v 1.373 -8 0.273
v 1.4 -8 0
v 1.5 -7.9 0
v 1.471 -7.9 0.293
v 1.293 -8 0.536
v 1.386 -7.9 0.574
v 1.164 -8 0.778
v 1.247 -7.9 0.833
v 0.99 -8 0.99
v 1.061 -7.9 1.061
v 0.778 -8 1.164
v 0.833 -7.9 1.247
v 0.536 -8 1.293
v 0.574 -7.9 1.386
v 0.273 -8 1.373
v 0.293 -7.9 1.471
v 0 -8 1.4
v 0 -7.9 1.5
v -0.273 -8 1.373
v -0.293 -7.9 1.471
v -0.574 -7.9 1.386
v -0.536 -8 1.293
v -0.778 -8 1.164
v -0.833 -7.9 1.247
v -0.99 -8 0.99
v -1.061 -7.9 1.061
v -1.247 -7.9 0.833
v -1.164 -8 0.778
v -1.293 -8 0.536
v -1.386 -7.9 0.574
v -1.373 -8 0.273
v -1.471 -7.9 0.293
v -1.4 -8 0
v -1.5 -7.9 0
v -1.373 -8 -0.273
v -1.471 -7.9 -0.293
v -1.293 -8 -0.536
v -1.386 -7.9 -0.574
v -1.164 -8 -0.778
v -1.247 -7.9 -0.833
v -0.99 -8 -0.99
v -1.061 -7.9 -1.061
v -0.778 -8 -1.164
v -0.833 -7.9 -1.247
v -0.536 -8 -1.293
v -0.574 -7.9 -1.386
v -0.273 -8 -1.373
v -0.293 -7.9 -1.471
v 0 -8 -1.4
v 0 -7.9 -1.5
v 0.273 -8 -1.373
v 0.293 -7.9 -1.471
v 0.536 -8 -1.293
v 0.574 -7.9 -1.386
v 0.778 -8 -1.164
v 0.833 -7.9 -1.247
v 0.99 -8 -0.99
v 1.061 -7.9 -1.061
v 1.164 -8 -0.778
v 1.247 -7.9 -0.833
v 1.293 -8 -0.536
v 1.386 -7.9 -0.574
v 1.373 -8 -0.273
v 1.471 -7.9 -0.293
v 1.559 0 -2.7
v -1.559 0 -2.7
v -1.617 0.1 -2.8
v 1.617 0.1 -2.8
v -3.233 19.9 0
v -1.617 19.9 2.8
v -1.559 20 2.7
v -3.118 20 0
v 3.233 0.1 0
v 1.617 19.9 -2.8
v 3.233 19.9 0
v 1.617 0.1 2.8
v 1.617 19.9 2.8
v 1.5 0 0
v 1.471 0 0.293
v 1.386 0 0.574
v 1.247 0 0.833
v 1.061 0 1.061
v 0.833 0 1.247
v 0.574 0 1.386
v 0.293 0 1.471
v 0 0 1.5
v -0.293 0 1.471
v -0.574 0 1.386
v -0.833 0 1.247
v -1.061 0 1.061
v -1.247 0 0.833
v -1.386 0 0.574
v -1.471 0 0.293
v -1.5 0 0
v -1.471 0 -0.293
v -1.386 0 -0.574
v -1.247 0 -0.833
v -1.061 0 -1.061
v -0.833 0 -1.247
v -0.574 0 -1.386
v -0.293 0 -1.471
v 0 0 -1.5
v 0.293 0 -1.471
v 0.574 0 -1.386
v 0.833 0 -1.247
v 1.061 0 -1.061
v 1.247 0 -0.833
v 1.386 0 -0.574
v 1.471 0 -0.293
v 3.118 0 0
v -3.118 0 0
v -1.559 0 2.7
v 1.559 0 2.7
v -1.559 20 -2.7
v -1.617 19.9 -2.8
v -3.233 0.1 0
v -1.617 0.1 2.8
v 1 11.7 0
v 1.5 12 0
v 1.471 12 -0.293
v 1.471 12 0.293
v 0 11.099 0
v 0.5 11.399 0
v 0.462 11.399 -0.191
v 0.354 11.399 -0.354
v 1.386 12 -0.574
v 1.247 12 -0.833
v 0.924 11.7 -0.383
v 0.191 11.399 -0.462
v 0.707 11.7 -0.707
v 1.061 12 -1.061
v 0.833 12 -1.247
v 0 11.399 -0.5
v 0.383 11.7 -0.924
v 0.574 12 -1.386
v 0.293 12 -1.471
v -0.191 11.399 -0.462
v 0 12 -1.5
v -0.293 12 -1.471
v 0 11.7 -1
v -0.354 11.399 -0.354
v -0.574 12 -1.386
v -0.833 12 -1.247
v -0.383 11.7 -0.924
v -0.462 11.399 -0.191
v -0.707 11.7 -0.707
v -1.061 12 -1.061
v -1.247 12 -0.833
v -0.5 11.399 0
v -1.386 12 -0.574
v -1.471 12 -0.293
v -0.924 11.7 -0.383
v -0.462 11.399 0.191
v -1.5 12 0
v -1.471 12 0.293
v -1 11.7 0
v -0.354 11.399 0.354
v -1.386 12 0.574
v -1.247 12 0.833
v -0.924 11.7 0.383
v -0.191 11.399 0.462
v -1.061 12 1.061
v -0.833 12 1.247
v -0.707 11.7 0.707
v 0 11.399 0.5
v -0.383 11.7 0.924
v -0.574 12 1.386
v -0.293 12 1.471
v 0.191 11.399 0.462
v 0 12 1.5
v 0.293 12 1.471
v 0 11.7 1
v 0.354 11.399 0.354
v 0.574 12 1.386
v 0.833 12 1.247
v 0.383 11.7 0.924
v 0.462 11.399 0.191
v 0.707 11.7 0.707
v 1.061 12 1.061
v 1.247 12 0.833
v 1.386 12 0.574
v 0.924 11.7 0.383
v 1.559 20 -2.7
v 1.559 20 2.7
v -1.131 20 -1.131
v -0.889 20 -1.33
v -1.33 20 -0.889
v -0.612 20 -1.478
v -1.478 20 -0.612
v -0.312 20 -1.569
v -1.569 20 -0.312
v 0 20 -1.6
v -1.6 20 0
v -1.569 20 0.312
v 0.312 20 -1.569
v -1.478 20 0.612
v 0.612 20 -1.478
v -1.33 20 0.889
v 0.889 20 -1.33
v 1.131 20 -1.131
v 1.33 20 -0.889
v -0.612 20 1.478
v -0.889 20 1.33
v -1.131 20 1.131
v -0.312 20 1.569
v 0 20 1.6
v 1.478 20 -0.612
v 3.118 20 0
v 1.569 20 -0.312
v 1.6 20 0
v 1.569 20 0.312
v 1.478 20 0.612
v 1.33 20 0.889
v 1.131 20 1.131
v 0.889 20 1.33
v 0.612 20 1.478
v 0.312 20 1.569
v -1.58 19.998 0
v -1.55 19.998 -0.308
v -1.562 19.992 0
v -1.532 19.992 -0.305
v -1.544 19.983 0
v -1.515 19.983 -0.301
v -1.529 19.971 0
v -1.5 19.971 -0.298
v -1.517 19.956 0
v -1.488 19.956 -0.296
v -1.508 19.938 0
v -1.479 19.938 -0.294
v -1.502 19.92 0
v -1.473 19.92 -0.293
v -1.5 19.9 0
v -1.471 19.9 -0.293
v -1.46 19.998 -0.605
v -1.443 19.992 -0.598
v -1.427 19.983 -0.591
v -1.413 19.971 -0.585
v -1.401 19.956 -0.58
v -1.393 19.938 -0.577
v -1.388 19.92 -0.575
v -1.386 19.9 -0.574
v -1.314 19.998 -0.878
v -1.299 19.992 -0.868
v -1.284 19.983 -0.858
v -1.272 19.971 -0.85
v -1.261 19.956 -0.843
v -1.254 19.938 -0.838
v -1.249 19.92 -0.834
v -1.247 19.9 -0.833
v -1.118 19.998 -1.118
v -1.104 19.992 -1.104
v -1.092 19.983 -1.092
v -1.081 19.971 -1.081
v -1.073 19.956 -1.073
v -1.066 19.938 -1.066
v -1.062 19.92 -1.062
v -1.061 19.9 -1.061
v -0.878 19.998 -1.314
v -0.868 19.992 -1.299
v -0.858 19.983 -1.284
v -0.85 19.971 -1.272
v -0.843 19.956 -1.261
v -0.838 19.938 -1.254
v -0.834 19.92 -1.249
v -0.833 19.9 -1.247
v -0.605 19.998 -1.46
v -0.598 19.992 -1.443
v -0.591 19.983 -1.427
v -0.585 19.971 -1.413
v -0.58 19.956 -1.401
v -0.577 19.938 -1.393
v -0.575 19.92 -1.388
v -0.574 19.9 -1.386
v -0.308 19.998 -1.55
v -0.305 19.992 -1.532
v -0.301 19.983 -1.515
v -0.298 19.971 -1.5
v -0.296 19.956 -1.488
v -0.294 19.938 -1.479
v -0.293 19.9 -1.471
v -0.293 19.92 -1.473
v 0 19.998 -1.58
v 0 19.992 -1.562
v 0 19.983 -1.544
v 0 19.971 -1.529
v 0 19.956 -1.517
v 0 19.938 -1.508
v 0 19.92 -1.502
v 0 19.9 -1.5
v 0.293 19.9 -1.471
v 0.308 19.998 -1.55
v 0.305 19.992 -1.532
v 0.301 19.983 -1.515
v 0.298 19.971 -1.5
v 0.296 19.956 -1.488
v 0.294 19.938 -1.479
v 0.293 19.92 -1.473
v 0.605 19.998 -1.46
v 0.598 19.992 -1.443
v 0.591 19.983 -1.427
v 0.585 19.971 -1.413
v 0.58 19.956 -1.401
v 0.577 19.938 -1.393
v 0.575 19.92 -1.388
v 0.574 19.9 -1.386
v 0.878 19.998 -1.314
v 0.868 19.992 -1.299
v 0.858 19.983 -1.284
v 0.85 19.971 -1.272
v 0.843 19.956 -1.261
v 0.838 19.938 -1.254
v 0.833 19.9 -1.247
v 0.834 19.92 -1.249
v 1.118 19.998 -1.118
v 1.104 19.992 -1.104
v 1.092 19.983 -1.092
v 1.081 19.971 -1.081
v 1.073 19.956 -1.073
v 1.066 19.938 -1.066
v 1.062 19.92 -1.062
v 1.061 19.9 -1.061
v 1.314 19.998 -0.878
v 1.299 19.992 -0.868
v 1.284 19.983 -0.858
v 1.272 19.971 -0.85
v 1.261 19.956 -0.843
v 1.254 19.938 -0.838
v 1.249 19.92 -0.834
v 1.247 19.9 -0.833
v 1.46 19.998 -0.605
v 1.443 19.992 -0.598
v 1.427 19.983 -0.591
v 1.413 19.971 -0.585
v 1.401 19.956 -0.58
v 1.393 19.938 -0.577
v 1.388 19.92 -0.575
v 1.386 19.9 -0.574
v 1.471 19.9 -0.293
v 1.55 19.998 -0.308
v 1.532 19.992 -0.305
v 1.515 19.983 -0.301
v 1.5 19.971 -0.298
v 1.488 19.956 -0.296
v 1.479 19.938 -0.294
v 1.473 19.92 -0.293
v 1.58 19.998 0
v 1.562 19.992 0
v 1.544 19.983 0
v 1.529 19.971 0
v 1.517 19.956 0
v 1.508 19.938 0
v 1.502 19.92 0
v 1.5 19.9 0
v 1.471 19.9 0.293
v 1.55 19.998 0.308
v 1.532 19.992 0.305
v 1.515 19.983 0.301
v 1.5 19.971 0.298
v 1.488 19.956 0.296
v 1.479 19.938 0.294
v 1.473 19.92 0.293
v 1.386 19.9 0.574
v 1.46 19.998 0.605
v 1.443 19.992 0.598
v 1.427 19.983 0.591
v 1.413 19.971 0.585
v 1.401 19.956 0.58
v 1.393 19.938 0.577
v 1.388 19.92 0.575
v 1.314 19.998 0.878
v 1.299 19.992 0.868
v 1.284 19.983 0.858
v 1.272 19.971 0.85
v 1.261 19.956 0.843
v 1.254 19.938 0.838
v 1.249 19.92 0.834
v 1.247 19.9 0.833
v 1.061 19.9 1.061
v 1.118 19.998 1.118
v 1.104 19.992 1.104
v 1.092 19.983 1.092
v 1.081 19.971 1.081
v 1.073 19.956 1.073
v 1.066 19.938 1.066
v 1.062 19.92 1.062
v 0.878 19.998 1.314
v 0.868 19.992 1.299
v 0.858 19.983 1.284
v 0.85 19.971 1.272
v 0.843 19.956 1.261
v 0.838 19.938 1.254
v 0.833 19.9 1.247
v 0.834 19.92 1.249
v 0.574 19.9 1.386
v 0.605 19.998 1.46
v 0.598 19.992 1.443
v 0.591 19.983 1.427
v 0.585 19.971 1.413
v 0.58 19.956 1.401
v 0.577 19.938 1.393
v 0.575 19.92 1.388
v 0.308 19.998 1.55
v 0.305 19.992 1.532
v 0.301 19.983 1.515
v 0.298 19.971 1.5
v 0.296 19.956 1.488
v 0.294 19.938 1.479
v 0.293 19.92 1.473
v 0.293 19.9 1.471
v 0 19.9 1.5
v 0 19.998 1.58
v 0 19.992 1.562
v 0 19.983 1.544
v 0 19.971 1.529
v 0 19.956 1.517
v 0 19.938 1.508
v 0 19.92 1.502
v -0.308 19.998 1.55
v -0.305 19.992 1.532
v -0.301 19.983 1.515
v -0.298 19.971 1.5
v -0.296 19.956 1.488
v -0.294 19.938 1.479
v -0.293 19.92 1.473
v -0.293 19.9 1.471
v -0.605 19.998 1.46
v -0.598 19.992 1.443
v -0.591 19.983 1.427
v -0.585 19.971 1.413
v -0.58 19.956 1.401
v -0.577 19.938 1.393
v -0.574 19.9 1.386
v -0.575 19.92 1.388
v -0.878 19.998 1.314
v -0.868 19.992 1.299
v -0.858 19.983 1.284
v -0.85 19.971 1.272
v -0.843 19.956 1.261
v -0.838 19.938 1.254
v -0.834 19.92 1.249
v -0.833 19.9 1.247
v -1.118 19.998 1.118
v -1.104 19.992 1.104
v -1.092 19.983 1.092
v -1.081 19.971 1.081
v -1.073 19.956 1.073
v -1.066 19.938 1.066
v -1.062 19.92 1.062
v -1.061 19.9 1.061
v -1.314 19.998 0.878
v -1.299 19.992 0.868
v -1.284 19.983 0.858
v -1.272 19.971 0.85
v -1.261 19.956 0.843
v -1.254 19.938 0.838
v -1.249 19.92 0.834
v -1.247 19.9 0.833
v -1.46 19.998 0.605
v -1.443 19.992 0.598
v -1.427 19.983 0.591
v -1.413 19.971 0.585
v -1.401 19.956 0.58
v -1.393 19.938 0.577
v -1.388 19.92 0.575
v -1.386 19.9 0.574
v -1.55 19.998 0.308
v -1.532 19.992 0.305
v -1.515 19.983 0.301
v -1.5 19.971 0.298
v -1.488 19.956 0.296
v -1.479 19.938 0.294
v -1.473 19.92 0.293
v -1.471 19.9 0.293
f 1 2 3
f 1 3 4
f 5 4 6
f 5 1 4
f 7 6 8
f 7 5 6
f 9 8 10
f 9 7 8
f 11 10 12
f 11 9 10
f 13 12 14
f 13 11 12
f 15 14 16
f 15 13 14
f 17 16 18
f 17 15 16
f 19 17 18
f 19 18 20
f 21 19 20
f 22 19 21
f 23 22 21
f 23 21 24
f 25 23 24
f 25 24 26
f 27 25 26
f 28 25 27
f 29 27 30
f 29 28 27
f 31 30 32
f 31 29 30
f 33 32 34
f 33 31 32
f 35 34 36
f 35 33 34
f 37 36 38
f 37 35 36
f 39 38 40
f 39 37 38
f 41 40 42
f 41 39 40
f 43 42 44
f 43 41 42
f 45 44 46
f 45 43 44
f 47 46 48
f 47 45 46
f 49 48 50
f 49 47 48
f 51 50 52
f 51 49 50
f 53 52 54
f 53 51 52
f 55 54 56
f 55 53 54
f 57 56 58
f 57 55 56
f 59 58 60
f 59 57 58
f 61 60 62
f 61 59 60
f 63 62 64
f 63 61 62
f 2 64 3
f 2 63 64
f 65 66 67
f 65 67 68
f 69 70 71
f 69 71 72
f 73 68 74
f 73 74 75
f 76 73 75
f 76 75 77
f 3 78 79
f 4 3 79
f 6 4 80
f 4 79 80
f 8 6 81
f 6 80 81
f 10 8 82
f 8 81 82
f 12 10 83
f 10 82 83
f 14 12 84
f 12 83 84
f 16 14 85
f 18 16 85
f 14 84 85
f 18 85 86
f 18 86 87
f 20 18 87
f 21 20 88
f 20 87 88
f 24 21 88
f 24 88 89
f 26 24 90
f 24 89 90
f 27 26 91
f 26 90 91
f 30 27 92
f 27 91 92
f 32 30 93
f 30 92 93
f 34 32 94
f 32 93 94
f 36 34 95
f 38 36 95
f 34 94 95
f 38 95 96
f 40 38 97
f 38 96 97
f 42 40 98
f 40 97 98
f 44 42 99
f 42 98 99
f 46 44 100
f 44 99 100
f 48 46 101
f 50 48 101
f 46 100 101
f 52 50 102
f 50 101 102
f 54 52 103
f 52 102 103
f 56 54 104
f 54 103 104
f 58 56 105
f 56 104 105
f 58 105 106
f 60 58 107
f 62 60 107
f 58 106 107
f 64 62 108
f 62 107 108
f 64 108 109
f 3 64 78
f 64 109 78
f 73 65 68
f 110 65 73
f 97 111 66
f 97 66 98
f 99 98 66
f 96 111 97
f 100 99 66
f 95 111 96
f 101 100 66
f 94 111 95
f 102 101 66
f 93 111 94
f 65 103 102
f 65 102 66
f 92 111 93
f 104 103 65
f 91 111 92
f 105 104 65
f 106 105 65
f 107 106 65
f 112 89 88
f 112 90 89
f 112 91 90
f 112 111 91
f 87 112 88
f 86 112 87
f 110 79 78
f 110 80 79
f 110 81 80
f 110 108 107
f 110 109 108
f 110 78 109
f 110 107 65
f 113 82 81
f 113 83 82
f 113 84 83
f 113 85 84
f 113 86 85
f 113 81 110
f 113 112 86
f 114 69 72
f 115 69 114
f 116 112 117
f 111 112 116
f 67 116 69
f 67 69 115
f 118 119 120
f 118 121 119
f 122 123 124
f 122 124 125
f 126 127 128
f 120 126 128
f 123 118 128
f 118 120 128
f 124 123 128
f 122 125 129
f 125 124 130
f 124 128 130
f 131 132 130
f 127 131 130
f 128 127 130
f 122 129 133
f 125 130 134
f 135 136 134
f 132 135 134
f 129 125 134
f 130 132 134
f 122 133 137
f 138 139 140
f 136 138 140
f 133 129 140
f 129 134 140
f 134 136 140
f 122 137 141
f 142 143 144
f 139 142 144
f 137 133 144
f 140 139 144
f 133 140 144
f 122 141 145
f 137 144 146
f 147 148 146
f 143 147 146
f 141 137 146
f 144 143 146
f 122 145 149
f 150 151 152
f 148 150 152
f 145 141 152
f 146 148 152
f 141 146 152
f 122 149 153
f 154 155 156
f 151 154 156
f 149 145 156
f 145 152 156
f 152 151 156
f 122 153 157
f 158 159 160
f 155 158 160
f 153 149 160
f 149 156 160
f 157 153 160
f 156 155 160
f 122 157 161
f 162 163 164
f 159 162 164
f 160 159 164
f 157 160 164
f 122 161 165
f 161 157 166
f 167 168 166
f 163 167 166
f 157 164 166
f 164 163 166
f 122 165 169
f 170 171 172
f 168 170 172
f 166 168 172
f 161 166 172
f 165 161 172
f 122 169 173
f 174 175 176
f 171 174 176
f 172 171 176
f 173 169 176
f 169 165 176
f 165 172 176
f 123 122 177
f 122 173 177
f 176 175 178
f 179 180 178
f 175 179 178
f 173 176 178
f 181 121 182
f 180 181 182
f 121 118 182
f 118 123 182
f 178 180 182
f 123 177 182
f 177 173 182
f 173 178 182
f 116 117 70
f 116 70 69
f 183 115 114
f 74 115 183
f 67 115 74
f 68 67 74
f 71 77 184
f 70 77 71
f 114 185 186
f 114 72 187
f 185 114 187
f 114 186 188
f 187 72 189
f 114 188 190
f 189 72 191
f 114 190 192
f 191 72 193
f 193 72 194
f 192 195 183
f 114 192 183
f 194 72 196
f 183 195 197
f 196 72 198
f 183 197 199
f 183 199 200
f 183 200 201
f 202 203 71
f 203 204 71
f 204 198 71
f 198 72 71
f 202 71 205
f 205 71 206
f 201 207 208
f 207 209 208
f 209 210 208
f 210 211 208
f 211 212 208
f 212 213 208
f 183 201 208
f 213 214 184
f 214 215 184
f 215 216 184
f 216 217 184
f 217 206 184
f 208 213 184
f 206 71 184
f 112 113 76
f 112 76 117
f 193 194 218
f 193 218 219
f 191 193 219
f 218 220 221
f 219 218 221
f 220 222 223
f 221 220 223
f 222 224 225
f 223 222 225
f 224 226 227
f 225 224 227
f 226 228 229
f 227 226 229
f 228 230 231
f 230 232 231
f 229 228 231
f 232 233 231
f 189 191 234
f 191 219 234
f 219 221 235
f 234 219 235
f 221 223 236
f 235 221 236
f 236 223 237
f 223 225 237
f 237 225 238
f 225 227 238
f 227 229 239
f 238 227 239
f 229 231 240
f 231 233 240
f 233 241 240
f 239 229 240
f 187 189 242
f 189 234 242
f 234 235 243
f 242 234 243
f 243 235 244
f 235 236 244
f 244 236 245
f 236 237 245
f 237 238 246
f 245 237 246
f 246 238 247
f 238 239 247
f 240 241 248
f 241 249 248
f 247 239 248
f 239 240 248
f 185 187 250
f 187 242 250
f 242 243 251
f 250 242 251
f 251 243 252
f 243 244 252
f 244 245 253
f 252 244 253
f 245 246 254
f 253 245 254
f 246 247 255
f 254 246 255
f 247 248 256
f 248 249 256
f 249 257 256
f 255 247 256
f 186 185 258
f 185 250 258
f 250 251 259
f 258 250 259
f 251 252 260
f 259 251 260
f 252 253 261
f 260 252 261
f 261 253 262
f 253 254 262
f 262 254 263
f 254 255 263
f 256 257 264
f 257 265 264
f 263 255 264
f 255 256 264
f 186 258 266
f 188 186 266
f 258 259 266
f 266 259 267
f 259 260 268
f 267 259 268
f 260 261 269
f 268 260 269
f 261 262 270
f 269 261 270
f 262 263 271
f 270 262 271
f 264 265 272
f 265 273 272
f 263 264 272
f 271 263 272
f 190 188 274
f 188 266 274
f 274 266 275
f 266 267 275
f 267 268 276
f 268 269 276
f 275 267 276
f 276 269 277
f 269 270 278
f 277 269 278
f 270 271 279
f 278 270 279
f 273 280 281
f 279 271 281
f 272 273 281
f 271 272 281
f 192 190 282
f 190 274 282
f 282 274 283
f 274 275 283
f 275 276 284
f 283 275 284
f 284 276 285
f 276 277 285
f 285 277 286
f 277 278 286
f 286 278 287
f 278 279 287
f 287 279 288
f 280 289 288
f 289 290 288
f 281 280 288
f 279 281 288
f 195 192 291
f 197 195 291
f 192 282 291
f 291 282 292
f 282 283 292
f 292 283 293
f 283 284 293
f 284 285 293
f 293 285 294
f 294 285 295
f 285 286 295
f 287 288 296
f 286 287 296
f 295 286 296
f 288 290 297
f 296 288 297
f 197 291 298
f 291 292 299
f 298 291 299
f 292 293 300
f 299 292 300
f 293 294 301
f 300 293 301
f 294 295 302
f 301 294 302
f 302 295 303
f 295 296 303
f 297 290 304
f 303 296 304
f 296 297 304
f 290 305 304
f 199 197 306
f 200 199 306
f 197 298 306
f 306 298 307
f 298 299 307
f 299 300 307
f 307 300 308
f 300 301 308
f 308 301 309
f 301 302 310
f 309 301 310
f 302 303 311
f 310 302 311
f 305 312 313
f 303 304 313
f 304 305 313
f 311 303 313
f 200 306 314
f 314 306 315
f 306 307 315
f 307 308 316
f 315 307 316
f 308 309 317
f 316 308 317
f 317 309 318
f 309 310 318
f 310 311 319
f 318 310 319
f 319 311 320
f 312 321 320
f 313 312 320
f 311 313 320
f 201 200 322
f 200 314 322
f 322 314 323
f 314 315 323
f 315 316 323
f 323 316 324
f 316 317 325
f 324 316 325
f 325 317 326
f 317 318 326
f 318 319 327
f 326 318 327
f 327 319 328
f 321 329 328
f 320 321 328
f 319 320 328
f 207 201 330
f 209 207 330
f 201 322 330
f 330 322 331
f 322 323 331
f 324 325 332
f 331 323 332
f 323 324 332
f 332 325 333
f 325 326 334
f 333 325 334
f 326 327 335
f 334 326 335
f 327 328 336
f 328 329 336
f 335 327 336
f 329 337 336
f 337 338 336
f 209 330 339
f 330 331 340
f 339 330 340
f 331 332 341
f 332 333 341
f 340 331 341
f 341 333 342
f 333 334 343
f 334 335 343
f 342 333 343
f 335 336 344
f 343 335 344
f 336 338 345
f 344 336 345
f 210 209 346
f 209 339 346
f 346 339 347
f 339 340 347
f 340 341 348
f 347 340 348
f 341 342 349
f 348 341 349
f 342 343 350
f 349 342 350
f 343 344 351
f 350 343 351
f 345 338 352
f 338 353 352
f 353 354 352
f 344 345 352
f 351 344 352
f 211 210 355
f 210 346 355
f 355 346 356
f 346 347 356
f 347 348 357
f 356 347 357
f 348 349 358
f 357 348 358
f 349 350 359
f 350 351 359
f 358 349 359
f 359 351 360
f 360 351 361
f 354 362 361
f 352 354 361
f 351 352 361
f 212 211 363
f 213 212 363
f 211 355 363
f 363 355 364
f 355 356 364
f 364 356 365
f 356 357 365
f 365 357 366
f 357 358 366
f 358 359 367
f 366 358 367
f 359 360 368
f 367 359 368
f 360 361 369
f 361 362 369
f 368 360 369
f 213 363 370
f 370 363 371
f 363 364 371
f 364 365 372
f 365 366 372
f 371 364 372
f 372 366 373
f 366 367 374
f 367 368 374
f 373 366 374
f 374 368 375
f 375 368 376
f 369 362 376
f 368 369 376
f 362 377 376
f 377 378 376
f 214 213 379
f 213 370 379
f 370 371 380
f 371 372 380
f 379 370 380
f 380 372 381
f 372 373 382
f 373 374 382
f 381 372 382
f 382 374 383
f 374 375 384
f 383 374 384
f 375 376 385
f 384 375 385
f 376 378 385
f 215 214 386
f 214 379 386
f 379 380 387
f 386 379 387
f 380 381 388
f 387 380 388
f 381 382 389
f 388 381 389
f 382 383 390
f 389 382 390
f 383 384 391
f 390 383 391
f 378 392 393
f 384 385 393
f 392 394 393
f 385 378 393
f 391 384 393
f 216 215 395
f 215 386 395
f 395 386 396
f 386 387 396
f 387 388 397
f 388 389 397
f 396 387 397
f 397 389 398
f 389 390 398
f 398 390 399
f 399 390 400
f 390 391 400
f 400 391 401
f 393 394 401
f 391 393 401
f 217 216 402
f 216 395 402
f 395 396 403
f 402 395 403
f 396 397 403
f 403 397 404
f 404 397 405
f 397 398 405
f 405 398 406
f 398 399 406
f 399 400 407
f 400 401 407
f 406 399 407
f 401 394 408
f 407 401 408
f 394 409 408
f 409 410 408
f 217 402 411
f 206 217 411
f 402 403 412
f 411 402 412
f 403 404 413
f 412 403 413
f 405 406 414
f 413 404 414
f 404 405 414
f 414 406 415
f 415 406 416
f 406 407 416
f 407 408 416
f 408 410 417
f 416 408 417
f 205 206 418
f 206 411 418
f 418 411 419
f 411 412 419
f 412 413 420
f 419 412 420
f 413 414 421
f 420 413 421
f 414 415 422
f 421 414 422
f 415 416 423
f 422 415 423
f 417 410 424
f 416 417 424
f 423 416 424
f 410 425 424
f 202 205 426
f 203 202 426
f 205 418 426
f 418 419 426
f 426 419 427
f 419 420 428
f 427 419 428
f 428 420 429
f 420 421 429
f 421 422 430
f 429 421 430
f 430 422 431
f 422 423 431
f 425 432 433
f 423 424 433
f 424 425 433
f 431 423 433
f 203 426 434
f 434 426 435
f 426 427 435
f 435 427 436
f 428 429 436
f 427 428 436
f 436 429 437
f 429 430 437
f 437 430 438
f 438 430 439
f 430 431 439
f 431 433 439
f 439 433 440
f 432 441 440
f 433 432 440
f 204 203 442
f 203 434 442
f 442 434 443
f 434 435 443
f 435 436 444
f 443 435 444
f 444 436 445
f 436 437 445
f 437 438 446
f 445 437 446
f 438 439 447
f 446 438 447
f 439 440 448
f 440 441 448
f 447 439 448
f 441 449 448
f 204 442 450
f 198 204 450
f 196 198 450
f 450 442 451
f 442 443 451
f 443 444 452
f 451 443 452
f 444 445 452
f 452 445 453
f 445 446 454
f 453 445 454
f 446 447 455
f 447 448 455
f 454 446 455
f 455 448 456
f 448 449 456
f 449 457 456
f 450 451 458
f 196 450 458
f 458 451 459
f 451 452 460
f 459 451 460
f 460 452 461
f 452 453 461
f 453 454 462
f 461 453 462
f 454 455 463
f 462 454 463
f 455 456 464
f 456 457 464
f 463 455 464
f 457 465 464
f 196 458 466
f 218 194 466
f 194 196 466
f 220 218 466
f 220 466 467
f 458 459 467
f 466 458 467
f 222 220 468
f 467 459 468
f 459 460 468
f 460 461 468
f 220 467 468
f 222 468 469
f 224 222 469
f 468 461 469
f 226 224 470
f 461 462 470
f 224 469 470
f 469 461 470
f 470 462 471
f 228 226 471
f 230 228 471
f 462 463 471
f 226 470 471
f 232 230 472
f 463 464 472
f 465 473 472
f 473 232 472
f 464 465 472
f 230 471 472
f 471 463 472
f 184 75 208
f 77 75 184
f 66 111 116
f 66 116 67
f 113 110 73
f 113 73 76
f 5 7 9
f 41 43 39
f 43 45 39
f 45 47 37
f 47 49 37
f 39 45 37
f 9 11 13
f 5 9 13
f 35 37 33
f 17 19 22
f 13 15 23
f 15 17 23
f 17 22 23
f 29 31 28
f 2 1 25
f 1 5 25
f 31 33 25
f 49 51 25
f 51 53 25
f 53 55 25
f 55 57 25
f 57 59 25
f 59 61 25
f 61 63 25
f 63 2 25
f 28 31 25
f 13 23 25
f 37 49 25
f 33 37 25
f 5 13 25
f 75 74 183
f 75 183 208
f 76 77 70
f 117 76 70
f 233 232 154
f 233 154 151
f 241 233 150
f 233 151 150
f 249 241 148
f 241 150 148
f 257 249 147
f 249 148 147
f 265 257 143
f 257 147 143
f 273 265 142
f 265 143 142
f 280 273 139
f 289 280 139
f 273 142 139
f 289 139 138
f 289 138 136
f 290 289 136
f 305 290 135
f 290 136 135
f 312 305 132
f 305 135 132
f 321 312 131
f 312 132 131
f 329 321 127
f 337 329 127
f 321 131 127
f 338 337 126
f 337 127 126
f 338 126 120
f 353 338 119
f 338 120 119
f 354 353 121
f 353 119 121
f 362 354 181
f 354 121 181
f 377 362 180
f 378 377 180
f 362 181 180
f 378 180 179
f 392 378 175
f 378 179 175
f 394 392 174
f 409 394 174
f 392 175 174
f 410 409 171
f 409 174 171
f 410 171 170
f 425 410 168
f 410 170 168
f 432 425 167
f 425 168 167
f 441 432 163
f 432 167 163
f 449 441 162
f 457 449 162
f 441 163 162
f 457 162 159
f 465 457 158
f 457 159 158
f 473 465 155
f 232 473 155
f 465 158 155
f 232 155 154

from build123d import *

# Parameters (mm, degrees)
BOSS_EXTRUDE1_DEPTH       = 20
SKETCH2_W                 = 1.5
SKETCH2_H                 = 8
F_3_0MM_DOWEL_HOLE1_D     = 3
F_3_0MM_DOWEL_HOLE1_DEPTH = 8
F_3_0MM_DOWEL_HOLE1_TIP   = 0.901290929
FILLET1_R                 = 0.1
CHAMFER1_SIZE             = 0.1


with BuildPart() as part:
    # Sketch1 → Boss-Extrude1 (new body)
    with BuildSketch(Plane.XZ):
        Polygon((-1.616580754, 2.8), (-3.233161507, 0), (-1.616580754, -2.8), (1.616580754, -2.8), (3.233161507, 0), (1.616580754, 2.8), align=None)
    extrude(amount=-BOSS_EXTRUDE1_DEPTH)

    # Sketch2 → Revolve1 (revolve)
    with BuildSketch(Plane.XY):
        with Locations((0.75, -4)):
            Rectangle(SKETCH2_W, SKETCH2_H)
    revolve(axis=Axis((0, 0, 0), (0, -1, 0)))

    # Ø3.0mm Dowel Hole1
    with Locations(Plane(origin=(0, 20, 0), x_dir=(1, 0, 0), z_dir=(0, 1, 0))):
        with Locations((0, 0)):
            Hole(F_3_0MM_DOWEL_HOLE1_D / 2, depth=F_3_0MM_DOWEL_HOLE1_DEPTH)
            with Locations((0, 0, -(F_3_0MM_DOWEL_HOLE1_DEPTH + F_3_0MM_DOWEL_HOLE1_TIP / 2))):  # 118° drill point
                Cone(0, F_3_0MM_DOWEL_HOLE1_D / 2, F_3_0MM_DOWEL_HOLE1_TIP, mode=Mode.SUBTRACT)

    # Fillet1
    fillet1_edges = [part.edges().sort_by_distance(p)[0] for p in [
        (1.5, 20, 0),
    ]]
    fillet(fillet1_edges, radius=FILLET1_R)

    # Chamfer1
    chamfer1_edges = [part.edges().sort_by_distance(p)[0] for p in [
        (-2.424871131, 20, -1.4),
        (0, 20, -2.8),
        (2.424871131, 20, -1.4),
        (2.424871131, 20, 1.4),
        (-1.5, -8, 0),
        (0, 20, 2.8),
        (2.424871131, 0, 1.4),
        (2.424871131, 0, -1.4),
        (0, 0, -2.8),
        (-2.424871131, 20, 1.4),
        (-2.424871131, 0, -1.4),
        (-2.424871131, 0, 1.4),
        (0, 0, 2.8),
    ]]
    chamfer(chamfer1_edges, length=CHAMFER1_SIZE)


solid = part.part
